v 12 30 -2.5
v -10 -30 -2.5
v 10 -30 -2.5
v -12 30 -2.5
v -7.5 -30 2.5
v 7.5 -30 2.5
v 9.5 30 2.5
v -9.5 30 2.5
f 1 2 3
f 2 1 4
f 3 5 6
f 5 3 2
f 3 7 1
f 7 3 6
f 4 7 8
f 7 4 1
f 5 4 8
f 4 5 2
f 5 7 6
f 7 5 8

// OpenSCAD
module slide(l, h, w1, w2){
    translate([-w1/2, -l/2, -h/2])
    polyhedron(
        points=[
            // lowest layer
            [0, 0, 0],
            [w1, 0, 0],
            [w2-((w2-w1)/2), l, 0],
            [-((w2-w1)/2), l, 0],

            // top layer
            [h/2, 0, h],
            [w1-h/2, 0, h],
            [w2-((w2-w1)/2)-h/2, l, h],
            [-((w2-w1)/2)+h/2, l, h],
            [0, h/2, h],
            [0, w1-h/2, h],
            [l, w2-((w2-w1)/2), h],
            [l, -((w2-w1)/2)+h/2, h]
        ],
        faces=[
            // bottom
            [0, 3, 2, 1],

            // sides beginning with front
            [0, 1, 5, 4],
            [1, 2, 6, 5],
            [3, 7, 6, 2],
            [0, 4, 7, 3],

            // top
            [4, 5, 6, 7]
        ]
    );
}

slide(60, 5, 20, 24);
